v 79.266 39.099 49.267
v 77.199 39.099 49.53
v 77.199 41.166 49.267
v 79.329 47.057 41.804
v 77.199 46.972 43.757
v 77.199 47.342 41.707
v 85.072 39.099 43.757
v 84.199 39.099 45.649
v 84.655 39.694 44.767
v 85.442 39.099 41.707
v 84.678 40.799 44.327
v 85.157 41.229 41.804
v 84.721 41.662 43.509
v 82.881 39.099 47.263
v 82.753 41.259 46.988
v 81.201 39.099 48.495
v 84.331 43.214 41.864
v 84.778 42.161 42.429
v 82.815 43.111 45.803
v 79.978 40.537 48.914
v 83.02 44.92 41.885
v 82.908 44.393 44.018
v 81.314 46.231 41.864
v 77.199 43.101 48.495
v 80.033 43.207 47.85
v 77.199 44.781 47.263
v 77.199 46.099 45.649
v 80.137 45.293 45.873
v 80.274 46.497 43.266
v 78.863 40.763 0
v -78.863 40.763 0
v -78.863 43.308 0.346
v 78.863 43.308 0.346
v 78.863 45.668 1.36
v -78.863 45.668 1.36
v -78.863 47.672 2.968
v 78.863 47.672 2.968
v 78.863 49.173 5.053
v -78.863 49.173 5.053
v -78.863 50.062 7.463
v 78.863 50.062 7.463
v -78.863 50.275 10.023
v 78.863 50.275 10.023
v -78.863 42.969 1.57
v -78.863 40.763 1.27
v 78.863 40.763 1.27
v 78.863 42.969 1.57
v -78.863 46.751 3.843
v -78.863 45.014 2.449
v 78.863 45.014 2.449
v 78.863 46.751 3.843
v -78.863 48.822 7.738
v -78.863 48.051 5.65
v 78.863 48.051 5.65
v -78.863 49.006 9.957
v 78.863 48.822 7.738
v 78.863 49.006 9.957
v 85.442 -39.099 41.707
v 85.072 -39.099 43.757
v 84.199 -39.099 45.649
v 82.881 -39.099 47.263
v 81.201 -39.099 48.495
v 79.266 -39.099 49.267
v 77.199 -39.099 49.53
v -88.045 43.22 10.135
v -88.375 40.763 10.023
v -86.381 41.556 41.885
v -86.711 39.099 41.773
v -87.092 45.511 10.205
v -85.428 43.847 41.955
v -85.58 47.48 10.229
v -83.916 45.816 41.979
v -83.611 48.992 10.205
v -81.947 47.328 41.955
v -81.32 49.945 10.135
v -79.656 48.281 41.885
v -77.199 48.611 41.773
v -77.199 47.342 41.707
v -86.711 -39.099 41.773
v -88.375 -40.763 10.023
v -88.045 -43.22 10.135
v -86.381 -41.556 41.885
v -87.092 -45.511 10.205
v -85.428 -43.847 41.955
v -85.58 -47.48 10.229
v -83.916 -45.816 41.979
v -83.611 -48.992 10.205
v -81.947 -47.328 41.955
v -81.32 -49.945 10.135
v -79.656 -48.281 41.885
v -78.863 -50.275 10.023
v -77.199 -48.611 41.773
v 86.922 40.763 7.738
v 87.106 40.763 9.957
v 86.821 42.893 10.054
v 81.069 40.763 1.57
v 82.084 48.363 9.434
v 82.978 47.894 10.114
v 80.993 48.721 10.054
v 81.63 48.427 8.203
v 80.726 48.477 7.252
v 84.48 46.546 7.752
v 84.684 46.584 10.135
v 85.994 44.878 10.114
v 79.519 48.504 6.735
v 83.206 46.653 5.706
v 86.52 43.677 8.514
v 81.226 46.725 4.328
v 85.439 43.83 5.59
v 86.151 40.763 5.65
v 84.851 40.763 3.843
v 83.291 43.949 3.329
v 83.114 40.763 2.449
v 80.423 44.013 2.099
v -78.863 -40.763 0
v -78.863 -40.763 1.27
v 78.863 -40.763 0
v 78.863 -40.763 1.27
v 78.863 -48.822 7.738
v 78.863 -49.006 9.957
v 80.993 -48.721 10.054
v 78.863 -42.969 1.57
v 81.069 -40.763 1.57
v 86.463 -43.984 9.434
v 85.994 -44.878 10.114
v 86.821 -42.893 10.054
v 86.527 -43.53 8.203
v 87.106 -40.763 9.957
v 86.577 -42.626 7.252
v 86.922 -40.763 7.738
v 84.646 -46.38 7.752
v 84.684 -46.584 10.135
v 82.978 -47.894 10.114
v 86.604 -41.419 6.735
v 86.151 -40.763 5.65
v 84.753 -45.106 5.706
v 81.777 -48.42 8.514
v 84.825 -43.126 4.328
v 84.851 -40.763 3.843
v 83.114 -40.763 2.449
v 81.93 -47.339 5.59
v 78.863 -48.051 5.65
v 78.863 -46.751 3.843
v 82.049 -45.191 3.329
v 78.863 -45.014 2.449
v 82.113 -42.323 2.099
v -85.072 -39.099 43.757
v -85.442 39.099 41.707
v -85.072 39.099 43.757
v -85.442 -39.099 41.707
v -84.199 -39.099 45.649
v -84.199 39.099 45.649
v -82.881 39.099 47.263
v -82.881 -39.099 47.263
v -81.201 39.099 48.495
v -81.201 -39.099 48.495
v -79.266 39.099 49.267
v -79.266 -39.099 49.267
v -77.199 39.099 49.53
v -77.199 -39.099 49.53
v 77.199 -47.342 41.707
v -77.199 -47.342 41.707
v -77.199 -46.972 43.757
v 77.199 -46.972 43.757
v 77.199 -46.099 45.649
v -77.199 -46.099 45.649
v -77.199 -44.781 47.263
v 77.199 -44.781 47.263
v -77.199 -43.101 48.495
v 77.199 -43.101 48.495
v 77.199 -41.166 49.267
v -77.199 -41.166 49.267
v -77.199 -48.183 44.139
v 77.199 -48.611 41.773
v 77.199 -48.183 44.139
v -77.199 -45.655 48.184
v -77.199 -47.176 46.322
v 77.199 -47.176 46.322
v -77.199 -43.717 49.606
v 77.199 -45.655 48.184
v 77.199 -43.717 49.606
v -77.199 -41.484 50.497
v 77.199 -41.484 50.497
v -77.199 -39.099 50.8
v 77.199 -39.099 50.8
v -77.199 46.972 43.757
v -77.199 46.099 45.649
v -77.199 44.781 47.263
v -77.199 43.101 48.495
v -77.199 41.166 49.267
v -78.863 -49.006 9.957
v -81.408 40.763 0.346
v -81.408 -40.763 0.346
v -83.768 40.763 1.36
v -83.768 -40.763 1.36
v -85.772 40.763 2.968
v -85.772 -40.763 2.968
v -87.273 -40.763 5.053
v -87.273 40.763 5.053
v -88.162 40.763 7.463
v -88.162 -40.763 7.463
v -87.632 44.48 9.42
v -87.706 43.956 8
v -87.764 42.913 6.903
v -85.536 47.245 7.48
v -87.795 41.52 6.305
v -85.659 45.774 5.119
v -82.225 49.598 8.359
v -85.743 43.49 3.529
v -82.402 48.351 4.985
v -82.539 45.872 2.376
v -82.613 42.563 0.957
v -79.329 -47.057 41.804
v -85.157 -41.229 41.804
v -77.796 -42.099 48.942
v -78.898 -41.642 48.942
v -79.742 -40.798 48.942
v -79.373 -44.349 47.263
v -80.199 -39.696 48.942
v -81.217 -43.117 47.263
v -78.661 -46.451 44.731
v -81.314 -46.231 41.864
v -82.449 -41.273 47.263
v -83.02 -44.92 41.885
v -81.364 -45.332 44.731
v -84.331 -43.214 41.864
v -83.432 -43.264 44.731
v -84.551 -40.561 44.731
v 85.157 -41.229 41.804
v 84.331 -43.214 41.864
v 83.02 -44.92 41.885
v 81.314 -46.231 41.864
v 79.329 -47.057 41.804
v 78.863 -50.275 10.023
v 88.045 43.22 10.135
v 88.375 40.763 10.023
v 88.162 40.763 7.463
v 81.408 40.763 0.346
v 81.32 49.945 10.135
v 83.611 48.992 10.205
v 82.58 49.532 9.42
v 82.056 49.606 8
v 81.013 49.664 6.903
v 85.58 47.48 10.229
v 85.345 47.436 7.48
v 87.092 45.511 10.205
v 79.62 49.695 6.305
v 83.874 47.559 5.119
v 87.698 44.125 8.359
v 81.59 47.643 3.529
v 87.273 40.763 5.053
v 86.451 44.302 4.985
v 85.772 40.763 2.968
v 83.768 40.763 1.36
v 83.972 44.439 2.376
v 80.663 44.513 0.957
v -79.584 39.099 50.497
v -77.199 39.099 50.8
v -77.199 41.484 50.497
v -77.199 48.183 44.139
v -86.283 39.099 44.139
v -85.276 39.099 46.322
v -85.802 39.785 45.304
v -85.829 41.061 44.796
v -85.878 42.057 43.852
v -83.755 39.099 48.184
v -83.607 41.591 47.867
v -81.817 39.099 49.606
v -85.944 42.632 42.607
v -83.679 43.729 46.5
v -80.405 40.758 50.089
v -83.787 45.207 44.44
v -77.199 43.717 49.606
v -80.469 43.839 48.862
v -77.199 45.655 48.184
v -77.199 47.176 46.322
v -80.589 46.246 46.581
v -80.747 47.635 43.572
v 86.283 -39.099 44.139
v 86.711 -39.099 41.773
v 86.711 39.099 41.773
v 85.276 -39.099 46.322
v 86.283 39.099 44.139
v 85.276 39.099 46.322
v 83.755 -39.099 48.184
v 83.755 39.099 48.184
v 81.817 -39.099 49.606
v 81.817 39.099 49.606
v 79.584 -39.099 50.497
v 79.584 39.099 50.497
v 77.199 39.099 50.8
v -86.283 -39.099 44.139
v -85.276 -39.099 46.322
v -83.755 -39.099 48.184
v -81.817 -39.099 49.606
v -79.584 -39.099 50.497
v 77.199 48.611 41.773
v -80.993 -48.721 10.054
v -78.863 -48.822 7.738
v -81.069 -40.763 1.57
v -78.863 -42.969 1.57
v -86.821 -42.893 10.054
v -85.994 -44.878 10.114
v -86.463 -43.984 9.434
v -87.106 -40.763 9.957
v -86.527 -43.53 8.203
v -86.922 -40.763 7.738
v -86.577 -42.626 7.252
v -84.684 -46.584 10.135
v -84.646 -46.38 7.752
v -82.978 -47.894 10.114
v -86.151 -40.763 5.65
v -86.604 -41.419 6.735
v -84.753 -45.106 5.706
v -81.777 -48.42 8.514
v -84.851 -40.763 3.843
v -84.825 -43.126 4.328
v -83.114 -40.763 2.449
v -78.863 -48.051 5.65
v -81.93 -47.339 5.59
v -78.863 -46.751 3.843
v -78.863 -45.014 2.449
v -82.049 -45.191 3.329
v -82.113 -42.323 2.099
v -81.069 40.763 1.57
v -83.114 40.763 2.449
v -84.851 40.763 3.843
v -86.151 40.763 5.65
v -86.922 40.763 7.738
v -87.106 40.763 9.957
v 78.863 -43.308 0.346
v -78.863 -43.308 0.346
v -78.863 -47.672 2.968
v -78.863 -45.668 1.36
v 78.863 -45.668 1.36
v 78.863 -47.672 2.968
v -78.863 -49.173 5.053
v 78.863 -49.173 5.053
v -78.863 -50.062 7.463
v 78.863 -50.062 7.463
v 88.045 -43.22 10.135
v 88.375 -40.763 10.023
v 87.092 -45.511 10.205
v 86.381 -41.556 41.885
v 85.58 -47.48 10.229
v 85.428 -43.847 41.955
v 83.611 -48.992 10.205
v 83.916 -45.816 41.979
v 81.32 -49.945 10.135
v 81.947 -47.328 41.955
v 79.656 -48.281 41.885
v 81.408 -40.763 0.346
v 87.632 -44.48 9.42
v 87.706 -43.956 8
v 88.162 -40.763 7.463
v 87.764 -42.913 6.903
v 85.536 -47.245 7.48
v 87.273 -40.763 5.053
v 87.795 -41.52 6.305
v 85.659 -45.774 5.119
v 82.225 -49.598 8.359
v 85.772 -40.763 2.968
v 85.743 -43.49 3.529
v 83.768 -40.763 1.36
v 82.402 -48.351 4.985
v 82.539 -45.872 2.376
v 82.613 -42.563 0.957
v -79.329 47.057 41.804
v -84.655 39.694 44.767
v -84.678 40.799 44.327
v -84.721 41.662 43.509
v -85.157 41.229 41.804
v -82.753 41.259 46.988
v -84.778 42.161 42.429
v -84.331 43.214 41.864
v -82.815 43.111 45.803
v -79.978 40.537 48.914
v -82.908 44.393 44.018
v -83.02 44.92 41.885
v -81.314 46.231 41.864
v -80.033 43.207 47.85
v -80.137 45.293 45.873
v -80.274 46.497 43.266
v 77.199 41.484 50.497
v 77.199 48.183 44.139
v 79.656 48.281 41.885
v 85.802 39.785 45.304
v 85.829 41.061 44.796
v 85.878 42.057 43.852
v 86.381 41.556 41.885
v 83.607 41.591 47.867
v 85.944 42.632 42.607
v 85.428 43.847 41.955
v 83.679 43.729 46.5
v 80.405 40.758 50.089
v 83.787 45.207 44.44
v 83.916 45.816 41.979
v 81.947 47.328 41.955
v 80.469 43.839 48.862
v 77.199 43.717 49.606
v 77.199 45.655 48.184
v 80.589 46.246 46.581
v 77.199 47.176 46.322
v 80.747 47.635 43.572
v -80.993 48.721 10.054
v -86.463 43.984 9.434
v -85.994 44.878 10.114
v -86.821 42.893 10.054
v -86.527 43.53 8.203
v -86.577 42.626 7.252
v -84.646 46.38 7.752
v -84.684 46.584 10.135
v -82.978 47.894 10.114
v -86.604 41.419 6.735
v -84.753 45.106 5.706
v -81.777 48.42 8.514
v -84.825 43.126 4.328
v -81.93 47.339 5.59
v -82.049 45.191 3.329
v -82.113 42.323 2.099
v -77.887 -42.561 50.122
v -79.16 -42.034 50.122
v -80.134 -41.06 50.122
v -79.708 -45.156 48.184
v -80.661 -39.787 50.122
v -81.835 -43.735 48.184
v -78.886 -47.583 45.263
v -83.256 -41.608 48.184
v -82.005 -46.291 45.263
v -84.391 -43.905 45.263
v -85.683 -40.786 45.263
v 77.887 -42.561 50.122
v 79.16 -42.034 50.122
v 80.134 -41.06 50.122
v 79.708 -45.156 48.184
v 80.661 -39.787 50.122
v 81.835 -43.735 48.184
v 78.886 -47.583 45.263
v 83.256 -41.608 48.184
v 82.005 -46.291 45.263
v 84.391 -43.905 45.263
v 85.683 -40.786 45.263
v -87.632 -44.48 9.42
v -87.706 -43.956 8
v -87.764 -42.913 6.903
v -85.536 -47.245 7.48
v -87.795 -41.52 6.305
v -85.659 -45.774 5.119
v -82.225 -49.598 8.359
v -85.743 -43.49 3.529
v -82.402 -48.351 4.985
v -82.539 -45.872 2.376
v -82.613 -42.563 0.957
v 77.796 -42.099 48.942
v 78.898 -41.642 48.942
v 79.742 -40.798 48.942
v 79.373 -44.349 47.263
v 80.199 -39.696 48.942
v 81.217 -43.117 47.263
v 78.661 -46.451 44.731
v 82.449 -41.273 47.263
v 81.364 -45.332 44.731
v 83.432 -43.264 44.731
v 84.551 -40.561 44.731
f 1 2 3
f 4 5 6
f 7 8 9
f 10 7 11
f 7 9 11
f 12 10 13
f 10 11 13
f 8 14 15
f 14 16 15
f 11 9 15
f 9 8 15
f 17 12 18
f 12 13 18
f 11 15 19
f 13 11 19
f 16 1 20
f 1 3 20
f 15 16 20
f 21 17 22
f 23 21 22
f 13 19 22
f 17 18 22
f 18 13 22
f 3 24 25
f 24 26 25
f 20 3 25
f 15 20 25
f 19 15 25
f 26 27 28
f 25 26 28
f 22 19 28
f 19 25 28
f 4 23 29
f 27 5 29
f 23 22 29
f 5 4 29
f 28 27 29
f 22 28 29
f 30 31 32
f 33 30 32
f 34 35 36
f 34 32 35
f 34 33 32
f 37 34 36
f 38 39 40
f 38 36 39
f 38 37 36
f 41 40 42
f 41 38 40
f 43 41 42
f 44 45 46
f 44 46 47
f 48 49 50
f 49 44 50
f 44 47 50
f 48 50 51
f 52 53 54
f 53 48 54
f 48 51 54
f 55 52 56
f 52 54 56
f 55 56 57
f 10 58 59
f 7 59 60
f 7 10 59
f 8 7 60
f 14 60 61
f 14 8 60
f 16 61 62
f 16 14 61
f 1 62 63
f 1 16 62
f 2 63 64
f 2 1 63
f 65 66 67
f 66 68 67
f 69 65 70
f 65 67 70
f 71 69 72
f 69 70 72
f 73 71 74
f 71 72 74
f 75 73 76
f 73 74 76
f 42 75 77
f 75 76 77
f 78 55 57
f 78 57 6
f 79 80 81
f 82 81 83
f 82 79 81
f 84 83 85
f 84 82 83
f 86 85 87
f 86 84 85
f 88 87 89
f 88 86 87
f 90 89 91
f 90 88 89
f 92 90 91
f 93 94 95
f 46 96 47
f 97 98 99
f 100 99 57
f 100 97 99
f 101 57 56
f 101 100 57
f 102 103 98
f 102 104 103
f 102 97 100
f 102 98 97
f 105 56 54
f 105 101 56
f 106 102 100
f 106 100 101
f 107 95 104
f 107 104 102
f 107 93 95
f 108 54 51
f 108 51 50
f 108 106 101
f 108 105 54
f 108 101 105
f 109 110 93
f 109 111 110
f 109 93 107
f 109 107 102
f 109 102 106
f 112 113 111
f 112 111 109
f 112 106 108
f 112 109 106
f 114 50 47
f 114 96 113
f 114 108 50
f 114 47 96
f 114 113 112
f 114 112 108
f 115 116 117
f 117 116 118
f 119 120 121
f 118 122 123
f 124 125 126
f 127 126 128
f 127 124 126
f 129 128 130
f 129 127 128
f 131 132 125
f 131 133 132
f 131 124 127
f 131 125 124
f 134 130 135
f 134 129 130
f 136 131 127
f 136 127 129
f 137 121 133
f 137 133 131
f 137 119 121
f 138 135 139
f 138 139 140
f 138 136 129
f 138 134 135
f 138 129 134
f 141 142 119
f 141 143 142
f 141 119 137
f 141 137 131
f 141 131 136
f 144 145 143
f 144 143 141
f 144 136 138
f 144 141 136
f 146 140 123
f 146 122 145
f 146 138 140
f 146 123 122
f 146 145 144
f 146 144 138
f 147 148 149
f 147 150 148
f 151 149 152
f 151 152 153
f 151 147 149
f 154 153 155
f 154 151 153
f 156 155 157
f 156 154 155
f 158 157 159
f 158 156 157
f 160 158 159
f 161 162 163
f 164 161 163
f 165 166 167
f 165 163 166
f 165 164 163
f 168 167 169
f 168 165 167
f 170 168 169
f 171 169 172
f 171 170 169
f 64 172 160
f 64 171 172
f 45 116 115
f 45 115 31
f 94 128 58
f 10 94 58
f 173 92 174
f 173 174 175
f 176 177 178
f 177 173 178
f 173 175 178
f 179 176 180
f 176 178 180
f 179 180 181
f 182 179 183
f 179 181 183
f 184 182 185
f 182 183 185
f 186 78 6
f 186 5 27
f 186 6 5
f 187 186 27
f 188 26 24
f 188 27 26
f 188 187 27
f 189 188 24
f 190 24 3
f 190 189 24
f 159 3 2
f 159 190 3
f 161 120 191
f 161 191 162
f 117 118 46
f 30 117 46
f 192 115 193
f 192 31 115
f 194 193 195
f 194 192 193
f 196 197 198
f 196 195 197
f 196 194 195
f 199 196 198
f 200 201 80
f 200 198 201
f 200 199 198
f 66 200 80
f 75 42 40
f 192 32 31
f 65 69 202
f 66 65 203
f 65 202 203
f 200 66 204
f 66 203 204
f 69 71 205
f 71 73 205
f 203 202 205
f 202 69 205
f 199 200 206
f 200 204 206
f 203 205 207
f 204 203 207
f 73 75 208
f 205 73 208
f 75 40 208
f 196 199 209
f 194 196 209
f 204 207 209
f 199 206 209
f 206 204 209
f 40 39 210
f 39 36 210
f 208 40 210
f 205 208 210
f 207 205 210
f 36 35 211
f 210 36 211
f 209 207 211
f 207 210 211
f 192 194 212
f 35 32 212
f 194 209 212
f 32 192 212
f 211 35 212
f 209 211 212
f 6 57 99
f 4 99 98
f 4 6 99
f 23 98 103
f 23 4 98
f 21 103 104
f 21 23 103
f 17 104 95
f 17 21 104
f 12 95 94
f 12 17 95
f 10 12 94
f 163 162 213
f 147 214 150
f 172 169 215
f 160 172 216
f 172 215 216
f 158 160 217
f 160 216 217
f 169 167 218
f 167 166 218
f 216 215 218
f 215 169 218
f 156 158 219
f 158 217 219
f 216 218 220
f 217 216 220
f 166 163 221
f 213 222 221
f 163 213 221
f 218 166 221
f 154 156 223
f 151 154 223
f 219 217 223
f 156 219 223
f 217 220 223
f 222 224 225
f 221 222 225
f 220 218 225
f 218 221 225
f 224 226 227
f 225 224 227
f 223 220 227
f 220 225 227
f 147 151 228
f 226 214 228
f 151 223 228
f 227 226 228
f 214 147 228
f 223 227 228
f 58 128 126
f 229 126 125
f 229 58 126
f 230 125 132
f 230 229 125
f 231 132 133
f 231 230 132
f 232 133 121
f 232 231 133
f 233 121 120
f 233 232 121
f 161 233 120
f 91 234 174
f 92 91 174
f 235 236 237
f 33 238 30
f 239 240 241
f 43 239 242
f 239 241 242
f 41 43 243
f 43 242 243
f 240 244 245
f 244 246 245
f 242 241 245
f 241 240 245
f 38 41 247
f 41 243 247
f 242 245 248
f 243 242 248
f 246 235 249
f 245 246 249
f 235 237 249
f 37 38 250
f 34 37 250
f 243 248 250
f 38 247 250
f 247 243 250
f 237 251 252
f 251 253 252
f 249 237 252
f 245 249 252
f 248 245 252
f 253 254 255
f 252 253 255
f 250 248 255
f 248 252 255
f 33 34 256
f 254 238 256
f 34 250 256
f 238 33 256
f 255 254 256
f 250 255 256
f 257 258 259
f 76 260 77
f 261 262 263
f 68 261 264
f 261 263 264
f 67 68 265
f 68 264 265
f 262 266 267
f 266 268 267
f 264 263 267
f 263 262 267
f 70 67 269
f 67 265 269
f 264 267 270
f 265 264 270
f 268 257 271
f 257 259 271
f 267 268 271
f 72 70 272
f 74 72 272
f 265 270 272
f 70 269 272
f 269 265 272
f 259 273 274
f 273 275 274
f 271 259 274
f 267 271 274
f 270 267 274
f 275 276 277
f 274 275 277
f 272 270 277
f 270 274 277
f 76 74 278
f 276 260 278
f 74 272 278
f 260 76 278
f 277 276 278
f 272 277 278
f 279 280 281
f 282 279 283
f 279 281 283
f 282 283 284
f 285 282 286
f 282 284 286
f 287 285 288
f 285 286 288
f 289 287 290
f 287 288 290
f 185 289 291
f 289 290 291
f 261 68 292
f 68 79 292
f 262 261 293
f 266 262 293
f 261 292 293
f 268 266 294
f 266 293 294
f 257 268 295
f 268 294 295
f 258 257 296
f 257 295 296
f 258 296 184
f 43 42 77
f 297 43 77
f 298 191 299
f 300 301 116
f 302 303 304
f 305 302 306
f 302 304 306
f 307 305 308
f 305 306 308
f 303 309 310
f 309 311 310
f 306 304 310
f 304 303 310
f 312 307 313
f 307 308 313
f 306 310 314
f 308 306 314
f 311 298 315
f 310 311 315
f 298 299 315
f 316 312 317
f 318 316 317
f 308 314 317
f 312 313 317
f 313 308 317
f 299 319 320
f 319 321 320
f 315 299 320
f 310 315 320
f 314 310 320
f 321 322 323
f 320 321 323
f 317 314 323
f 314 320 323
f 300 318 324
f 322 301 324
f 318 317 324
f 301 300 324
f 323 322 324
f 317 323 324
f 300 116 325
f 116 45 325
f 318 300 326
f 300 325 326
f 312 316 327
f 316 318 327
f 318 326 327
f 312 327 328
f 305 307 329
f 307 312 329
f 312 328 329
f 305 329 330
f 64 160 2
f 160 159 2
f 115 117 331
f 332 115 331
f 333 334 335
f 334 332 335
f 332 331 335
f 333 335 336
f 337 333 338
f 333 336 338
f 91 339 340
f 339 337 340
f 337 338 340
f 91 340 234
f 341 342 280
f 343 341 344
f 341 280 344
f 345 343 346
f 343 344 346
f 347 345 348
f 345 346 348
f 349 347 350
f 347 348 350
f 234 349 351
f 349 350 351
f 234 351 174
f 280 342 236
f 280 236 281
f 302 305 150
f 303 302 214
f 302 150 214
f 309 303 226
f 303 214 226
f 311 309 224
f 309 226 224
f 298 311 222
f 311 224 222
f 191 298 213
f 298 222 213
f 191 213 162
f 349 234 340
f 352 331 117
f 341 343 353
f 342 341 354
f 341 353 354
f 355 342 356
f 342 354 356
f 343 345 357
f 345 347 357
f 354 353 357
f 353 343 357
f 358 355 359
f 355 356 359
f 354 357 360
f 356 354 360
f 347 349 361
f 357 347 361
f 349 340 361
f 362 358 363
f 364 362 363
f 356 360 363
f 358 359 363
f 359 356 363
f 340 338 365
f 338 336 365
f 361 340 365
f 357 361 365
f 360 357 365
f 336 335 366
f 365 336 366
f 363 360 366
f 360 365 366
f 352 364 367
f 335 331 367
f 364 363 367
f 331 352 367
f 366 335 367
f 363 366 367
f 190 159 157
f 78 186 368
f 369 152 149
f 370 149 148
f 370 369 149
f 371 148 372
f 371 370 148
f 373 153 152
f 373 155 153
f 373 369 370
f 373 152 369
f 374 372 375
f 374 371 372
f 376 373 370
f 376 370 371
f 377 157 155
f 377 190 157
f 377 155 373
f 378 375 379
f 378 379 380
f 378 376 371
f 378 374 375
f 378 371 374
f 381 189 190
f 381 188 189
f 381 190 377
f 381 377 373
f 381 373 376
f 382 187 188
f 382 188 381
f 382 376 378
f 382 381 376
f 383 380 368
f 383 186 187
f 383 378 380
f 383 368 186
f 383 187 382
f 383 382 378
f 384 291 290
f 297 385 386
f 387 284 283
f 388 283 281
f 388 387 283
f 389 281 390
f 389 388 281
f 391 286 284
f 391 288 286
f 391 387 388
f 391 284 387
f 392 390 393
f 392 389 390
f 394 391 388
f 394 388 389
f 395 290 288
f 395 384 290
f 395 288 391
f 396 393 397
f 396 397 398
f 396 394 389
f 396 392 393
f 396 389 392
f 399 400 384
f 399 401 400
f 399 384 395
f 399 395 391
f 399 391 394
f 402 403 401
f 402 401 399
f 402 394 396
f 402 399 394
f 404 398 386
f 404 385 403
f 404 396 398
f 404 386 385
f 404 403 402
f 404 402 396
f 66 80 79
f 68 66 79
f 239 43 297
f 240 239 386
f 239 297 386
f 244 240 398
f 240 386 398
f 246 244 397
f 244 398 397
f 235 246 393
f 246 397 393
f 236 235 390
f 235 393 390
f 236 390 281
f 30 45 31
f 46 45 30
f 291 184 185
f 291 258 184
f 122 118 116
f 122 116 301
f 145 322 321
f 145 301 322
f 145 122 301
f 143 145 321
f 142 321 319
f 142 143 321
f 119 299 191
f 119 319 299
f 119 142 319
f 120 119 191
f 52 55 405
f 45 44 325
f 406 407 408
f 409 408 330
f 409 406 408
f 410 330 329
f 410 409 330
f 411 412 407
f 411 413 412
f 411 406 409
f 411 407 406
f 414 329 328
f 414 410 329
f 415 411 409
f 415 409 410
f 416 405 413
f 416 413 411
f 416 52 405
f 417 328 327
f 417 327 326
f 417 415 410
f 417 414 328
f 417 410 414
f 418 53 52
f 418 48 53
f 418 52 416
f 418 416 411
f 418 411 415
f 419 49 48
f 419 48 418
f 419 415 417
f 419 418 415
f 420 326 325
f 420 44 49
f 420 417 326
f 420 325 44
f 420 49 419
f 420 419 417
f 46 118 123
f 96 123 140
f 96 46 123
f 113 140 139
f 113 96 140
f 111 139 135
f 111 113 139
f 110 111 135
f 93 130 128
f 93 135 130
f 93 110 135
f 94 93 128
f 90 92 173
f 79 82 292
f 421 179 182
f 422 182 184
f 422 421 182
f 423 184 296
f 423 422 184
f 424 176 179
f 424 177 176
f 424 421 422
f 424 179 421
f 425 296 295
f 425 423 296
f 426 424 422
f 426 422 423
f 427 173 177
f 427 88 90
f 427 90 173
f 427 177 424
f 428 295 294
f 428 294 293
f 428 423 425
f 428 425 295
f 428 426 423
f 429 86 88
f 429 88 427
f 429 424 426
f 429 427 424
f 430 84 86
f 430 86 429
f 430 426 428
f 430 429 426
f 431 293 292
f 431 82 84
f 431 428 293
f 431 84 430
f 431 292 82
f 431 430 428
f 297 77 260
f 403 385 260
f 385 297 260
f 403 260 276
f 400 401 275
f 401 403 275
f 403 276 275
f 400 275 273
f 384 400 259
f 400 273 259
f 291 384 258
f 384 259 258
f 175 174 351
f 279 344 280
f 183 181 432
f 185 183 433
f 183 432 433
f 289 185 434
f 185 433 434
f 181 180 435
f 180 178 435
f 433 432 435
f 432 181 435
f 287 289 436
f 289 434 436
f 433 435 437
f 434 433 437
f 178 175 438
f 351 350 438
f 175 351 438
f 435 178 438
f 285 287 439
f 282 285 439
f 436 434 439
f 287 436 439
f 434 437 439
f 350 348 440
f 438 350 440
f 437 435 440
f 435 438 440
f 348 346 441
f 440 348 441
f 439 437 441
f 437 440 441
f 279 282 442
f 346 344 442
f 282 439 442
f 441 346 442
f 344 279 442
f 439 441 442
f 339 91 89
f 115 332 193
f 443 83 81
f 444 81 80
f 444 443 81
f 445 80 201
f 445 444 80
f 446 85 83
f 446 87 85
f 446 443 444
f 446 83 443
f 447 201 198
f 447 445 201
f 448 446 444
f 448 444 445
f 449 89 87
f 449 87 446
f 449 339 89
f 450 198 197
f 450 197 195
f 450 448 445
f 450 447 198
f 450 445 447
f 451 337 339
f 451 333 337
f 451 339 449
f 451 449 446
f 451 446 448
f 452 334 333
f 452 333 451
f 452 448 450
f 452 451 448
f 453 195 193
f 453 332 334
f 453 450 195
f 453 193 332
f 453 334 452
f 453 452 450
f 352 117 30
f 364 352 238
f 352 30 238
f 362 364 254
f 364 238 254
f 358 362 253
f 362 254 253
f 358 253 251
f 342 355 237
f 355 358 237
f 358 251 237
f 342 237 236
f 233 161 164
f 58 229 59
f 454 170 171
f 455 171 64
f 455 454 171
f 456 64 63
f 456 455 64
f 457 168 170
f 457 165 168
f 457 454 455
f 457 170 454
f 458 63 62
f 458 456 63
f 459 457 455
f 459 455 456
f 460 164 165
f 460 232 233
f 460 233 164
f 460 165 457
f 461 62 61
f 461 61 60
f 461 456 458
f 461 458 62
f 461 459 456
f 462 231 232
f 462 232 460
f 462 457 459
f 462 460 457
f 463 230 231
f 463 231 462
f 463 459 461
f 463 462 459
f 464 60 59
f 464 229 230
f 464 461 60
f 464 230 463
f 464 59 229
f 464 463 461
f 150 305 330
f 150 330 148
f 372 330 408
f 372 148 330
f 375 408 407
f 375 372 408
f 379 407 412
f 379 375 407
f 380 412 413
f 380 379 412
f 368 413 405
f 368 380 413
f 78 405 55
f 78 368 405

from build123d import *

# Parameters (mm, degrees)
F0_W     = 177.8
F0_H     = 101.6
F1_DEPTH = 50.8
F1_TAPER = 3
F2_R     = 9.525
F3_T     = -1.27


# Not quite as in the source:
# - a shell that OpenCascade refuses in one call is made with other operations: the cavity is built on its own and cut out


with BuildPart() as f1:
    # F0 (on Top) → F1 (new body)
    with BuildSketch(Plane.XY):
        Rectangle(F0_W, F0_H)
    extrude(amount=F1_DEPTH, taper=F1_TAPER)

    # F2
    f2_edges = [f1.edges().sort_by_distance(p)[0] for p in [
        (0, -50.8, 0),
        (87.568842, -49.468842, 25.4),
        (-87.568842, -49.468842, 25.4),
        (0, -48.137685, 50.8),
        (0, 48.137685, 50.8),
        (-86.237685, 0, 50.8),
        (86.237685, 0, 50.8),
        (88.9, 0, 0),
        (87.568842, 49.468842, 25.4),
        (0, 50.8, 0),
        (-87.568842, 49.468842, 25.4),
        (-88.9, 0, 0),
    ]]
    fillet(f2_edges, radius=F2_R)

    # F3: a shell. OpenCascade refuses it in one call, so the cavity is built on its own and cut out:
    # the body offset inwards by the wall thickness, plus a prism from it out through each open face.
    f3_core = offset(f1.part, amount=F3_T, mode=Mode.PRIVATE)
    f3_exits = [f3_core.faces().sort_by_distance(p)[0] for p in [
        (0, 0, 1.27),
    ]]
    add(f3_core, mode=Mode.SUBTRACT)
    extrude(f3_exits, amount=-F3_T, mode=Mode.SUBTRACT)


solid = f1.part
